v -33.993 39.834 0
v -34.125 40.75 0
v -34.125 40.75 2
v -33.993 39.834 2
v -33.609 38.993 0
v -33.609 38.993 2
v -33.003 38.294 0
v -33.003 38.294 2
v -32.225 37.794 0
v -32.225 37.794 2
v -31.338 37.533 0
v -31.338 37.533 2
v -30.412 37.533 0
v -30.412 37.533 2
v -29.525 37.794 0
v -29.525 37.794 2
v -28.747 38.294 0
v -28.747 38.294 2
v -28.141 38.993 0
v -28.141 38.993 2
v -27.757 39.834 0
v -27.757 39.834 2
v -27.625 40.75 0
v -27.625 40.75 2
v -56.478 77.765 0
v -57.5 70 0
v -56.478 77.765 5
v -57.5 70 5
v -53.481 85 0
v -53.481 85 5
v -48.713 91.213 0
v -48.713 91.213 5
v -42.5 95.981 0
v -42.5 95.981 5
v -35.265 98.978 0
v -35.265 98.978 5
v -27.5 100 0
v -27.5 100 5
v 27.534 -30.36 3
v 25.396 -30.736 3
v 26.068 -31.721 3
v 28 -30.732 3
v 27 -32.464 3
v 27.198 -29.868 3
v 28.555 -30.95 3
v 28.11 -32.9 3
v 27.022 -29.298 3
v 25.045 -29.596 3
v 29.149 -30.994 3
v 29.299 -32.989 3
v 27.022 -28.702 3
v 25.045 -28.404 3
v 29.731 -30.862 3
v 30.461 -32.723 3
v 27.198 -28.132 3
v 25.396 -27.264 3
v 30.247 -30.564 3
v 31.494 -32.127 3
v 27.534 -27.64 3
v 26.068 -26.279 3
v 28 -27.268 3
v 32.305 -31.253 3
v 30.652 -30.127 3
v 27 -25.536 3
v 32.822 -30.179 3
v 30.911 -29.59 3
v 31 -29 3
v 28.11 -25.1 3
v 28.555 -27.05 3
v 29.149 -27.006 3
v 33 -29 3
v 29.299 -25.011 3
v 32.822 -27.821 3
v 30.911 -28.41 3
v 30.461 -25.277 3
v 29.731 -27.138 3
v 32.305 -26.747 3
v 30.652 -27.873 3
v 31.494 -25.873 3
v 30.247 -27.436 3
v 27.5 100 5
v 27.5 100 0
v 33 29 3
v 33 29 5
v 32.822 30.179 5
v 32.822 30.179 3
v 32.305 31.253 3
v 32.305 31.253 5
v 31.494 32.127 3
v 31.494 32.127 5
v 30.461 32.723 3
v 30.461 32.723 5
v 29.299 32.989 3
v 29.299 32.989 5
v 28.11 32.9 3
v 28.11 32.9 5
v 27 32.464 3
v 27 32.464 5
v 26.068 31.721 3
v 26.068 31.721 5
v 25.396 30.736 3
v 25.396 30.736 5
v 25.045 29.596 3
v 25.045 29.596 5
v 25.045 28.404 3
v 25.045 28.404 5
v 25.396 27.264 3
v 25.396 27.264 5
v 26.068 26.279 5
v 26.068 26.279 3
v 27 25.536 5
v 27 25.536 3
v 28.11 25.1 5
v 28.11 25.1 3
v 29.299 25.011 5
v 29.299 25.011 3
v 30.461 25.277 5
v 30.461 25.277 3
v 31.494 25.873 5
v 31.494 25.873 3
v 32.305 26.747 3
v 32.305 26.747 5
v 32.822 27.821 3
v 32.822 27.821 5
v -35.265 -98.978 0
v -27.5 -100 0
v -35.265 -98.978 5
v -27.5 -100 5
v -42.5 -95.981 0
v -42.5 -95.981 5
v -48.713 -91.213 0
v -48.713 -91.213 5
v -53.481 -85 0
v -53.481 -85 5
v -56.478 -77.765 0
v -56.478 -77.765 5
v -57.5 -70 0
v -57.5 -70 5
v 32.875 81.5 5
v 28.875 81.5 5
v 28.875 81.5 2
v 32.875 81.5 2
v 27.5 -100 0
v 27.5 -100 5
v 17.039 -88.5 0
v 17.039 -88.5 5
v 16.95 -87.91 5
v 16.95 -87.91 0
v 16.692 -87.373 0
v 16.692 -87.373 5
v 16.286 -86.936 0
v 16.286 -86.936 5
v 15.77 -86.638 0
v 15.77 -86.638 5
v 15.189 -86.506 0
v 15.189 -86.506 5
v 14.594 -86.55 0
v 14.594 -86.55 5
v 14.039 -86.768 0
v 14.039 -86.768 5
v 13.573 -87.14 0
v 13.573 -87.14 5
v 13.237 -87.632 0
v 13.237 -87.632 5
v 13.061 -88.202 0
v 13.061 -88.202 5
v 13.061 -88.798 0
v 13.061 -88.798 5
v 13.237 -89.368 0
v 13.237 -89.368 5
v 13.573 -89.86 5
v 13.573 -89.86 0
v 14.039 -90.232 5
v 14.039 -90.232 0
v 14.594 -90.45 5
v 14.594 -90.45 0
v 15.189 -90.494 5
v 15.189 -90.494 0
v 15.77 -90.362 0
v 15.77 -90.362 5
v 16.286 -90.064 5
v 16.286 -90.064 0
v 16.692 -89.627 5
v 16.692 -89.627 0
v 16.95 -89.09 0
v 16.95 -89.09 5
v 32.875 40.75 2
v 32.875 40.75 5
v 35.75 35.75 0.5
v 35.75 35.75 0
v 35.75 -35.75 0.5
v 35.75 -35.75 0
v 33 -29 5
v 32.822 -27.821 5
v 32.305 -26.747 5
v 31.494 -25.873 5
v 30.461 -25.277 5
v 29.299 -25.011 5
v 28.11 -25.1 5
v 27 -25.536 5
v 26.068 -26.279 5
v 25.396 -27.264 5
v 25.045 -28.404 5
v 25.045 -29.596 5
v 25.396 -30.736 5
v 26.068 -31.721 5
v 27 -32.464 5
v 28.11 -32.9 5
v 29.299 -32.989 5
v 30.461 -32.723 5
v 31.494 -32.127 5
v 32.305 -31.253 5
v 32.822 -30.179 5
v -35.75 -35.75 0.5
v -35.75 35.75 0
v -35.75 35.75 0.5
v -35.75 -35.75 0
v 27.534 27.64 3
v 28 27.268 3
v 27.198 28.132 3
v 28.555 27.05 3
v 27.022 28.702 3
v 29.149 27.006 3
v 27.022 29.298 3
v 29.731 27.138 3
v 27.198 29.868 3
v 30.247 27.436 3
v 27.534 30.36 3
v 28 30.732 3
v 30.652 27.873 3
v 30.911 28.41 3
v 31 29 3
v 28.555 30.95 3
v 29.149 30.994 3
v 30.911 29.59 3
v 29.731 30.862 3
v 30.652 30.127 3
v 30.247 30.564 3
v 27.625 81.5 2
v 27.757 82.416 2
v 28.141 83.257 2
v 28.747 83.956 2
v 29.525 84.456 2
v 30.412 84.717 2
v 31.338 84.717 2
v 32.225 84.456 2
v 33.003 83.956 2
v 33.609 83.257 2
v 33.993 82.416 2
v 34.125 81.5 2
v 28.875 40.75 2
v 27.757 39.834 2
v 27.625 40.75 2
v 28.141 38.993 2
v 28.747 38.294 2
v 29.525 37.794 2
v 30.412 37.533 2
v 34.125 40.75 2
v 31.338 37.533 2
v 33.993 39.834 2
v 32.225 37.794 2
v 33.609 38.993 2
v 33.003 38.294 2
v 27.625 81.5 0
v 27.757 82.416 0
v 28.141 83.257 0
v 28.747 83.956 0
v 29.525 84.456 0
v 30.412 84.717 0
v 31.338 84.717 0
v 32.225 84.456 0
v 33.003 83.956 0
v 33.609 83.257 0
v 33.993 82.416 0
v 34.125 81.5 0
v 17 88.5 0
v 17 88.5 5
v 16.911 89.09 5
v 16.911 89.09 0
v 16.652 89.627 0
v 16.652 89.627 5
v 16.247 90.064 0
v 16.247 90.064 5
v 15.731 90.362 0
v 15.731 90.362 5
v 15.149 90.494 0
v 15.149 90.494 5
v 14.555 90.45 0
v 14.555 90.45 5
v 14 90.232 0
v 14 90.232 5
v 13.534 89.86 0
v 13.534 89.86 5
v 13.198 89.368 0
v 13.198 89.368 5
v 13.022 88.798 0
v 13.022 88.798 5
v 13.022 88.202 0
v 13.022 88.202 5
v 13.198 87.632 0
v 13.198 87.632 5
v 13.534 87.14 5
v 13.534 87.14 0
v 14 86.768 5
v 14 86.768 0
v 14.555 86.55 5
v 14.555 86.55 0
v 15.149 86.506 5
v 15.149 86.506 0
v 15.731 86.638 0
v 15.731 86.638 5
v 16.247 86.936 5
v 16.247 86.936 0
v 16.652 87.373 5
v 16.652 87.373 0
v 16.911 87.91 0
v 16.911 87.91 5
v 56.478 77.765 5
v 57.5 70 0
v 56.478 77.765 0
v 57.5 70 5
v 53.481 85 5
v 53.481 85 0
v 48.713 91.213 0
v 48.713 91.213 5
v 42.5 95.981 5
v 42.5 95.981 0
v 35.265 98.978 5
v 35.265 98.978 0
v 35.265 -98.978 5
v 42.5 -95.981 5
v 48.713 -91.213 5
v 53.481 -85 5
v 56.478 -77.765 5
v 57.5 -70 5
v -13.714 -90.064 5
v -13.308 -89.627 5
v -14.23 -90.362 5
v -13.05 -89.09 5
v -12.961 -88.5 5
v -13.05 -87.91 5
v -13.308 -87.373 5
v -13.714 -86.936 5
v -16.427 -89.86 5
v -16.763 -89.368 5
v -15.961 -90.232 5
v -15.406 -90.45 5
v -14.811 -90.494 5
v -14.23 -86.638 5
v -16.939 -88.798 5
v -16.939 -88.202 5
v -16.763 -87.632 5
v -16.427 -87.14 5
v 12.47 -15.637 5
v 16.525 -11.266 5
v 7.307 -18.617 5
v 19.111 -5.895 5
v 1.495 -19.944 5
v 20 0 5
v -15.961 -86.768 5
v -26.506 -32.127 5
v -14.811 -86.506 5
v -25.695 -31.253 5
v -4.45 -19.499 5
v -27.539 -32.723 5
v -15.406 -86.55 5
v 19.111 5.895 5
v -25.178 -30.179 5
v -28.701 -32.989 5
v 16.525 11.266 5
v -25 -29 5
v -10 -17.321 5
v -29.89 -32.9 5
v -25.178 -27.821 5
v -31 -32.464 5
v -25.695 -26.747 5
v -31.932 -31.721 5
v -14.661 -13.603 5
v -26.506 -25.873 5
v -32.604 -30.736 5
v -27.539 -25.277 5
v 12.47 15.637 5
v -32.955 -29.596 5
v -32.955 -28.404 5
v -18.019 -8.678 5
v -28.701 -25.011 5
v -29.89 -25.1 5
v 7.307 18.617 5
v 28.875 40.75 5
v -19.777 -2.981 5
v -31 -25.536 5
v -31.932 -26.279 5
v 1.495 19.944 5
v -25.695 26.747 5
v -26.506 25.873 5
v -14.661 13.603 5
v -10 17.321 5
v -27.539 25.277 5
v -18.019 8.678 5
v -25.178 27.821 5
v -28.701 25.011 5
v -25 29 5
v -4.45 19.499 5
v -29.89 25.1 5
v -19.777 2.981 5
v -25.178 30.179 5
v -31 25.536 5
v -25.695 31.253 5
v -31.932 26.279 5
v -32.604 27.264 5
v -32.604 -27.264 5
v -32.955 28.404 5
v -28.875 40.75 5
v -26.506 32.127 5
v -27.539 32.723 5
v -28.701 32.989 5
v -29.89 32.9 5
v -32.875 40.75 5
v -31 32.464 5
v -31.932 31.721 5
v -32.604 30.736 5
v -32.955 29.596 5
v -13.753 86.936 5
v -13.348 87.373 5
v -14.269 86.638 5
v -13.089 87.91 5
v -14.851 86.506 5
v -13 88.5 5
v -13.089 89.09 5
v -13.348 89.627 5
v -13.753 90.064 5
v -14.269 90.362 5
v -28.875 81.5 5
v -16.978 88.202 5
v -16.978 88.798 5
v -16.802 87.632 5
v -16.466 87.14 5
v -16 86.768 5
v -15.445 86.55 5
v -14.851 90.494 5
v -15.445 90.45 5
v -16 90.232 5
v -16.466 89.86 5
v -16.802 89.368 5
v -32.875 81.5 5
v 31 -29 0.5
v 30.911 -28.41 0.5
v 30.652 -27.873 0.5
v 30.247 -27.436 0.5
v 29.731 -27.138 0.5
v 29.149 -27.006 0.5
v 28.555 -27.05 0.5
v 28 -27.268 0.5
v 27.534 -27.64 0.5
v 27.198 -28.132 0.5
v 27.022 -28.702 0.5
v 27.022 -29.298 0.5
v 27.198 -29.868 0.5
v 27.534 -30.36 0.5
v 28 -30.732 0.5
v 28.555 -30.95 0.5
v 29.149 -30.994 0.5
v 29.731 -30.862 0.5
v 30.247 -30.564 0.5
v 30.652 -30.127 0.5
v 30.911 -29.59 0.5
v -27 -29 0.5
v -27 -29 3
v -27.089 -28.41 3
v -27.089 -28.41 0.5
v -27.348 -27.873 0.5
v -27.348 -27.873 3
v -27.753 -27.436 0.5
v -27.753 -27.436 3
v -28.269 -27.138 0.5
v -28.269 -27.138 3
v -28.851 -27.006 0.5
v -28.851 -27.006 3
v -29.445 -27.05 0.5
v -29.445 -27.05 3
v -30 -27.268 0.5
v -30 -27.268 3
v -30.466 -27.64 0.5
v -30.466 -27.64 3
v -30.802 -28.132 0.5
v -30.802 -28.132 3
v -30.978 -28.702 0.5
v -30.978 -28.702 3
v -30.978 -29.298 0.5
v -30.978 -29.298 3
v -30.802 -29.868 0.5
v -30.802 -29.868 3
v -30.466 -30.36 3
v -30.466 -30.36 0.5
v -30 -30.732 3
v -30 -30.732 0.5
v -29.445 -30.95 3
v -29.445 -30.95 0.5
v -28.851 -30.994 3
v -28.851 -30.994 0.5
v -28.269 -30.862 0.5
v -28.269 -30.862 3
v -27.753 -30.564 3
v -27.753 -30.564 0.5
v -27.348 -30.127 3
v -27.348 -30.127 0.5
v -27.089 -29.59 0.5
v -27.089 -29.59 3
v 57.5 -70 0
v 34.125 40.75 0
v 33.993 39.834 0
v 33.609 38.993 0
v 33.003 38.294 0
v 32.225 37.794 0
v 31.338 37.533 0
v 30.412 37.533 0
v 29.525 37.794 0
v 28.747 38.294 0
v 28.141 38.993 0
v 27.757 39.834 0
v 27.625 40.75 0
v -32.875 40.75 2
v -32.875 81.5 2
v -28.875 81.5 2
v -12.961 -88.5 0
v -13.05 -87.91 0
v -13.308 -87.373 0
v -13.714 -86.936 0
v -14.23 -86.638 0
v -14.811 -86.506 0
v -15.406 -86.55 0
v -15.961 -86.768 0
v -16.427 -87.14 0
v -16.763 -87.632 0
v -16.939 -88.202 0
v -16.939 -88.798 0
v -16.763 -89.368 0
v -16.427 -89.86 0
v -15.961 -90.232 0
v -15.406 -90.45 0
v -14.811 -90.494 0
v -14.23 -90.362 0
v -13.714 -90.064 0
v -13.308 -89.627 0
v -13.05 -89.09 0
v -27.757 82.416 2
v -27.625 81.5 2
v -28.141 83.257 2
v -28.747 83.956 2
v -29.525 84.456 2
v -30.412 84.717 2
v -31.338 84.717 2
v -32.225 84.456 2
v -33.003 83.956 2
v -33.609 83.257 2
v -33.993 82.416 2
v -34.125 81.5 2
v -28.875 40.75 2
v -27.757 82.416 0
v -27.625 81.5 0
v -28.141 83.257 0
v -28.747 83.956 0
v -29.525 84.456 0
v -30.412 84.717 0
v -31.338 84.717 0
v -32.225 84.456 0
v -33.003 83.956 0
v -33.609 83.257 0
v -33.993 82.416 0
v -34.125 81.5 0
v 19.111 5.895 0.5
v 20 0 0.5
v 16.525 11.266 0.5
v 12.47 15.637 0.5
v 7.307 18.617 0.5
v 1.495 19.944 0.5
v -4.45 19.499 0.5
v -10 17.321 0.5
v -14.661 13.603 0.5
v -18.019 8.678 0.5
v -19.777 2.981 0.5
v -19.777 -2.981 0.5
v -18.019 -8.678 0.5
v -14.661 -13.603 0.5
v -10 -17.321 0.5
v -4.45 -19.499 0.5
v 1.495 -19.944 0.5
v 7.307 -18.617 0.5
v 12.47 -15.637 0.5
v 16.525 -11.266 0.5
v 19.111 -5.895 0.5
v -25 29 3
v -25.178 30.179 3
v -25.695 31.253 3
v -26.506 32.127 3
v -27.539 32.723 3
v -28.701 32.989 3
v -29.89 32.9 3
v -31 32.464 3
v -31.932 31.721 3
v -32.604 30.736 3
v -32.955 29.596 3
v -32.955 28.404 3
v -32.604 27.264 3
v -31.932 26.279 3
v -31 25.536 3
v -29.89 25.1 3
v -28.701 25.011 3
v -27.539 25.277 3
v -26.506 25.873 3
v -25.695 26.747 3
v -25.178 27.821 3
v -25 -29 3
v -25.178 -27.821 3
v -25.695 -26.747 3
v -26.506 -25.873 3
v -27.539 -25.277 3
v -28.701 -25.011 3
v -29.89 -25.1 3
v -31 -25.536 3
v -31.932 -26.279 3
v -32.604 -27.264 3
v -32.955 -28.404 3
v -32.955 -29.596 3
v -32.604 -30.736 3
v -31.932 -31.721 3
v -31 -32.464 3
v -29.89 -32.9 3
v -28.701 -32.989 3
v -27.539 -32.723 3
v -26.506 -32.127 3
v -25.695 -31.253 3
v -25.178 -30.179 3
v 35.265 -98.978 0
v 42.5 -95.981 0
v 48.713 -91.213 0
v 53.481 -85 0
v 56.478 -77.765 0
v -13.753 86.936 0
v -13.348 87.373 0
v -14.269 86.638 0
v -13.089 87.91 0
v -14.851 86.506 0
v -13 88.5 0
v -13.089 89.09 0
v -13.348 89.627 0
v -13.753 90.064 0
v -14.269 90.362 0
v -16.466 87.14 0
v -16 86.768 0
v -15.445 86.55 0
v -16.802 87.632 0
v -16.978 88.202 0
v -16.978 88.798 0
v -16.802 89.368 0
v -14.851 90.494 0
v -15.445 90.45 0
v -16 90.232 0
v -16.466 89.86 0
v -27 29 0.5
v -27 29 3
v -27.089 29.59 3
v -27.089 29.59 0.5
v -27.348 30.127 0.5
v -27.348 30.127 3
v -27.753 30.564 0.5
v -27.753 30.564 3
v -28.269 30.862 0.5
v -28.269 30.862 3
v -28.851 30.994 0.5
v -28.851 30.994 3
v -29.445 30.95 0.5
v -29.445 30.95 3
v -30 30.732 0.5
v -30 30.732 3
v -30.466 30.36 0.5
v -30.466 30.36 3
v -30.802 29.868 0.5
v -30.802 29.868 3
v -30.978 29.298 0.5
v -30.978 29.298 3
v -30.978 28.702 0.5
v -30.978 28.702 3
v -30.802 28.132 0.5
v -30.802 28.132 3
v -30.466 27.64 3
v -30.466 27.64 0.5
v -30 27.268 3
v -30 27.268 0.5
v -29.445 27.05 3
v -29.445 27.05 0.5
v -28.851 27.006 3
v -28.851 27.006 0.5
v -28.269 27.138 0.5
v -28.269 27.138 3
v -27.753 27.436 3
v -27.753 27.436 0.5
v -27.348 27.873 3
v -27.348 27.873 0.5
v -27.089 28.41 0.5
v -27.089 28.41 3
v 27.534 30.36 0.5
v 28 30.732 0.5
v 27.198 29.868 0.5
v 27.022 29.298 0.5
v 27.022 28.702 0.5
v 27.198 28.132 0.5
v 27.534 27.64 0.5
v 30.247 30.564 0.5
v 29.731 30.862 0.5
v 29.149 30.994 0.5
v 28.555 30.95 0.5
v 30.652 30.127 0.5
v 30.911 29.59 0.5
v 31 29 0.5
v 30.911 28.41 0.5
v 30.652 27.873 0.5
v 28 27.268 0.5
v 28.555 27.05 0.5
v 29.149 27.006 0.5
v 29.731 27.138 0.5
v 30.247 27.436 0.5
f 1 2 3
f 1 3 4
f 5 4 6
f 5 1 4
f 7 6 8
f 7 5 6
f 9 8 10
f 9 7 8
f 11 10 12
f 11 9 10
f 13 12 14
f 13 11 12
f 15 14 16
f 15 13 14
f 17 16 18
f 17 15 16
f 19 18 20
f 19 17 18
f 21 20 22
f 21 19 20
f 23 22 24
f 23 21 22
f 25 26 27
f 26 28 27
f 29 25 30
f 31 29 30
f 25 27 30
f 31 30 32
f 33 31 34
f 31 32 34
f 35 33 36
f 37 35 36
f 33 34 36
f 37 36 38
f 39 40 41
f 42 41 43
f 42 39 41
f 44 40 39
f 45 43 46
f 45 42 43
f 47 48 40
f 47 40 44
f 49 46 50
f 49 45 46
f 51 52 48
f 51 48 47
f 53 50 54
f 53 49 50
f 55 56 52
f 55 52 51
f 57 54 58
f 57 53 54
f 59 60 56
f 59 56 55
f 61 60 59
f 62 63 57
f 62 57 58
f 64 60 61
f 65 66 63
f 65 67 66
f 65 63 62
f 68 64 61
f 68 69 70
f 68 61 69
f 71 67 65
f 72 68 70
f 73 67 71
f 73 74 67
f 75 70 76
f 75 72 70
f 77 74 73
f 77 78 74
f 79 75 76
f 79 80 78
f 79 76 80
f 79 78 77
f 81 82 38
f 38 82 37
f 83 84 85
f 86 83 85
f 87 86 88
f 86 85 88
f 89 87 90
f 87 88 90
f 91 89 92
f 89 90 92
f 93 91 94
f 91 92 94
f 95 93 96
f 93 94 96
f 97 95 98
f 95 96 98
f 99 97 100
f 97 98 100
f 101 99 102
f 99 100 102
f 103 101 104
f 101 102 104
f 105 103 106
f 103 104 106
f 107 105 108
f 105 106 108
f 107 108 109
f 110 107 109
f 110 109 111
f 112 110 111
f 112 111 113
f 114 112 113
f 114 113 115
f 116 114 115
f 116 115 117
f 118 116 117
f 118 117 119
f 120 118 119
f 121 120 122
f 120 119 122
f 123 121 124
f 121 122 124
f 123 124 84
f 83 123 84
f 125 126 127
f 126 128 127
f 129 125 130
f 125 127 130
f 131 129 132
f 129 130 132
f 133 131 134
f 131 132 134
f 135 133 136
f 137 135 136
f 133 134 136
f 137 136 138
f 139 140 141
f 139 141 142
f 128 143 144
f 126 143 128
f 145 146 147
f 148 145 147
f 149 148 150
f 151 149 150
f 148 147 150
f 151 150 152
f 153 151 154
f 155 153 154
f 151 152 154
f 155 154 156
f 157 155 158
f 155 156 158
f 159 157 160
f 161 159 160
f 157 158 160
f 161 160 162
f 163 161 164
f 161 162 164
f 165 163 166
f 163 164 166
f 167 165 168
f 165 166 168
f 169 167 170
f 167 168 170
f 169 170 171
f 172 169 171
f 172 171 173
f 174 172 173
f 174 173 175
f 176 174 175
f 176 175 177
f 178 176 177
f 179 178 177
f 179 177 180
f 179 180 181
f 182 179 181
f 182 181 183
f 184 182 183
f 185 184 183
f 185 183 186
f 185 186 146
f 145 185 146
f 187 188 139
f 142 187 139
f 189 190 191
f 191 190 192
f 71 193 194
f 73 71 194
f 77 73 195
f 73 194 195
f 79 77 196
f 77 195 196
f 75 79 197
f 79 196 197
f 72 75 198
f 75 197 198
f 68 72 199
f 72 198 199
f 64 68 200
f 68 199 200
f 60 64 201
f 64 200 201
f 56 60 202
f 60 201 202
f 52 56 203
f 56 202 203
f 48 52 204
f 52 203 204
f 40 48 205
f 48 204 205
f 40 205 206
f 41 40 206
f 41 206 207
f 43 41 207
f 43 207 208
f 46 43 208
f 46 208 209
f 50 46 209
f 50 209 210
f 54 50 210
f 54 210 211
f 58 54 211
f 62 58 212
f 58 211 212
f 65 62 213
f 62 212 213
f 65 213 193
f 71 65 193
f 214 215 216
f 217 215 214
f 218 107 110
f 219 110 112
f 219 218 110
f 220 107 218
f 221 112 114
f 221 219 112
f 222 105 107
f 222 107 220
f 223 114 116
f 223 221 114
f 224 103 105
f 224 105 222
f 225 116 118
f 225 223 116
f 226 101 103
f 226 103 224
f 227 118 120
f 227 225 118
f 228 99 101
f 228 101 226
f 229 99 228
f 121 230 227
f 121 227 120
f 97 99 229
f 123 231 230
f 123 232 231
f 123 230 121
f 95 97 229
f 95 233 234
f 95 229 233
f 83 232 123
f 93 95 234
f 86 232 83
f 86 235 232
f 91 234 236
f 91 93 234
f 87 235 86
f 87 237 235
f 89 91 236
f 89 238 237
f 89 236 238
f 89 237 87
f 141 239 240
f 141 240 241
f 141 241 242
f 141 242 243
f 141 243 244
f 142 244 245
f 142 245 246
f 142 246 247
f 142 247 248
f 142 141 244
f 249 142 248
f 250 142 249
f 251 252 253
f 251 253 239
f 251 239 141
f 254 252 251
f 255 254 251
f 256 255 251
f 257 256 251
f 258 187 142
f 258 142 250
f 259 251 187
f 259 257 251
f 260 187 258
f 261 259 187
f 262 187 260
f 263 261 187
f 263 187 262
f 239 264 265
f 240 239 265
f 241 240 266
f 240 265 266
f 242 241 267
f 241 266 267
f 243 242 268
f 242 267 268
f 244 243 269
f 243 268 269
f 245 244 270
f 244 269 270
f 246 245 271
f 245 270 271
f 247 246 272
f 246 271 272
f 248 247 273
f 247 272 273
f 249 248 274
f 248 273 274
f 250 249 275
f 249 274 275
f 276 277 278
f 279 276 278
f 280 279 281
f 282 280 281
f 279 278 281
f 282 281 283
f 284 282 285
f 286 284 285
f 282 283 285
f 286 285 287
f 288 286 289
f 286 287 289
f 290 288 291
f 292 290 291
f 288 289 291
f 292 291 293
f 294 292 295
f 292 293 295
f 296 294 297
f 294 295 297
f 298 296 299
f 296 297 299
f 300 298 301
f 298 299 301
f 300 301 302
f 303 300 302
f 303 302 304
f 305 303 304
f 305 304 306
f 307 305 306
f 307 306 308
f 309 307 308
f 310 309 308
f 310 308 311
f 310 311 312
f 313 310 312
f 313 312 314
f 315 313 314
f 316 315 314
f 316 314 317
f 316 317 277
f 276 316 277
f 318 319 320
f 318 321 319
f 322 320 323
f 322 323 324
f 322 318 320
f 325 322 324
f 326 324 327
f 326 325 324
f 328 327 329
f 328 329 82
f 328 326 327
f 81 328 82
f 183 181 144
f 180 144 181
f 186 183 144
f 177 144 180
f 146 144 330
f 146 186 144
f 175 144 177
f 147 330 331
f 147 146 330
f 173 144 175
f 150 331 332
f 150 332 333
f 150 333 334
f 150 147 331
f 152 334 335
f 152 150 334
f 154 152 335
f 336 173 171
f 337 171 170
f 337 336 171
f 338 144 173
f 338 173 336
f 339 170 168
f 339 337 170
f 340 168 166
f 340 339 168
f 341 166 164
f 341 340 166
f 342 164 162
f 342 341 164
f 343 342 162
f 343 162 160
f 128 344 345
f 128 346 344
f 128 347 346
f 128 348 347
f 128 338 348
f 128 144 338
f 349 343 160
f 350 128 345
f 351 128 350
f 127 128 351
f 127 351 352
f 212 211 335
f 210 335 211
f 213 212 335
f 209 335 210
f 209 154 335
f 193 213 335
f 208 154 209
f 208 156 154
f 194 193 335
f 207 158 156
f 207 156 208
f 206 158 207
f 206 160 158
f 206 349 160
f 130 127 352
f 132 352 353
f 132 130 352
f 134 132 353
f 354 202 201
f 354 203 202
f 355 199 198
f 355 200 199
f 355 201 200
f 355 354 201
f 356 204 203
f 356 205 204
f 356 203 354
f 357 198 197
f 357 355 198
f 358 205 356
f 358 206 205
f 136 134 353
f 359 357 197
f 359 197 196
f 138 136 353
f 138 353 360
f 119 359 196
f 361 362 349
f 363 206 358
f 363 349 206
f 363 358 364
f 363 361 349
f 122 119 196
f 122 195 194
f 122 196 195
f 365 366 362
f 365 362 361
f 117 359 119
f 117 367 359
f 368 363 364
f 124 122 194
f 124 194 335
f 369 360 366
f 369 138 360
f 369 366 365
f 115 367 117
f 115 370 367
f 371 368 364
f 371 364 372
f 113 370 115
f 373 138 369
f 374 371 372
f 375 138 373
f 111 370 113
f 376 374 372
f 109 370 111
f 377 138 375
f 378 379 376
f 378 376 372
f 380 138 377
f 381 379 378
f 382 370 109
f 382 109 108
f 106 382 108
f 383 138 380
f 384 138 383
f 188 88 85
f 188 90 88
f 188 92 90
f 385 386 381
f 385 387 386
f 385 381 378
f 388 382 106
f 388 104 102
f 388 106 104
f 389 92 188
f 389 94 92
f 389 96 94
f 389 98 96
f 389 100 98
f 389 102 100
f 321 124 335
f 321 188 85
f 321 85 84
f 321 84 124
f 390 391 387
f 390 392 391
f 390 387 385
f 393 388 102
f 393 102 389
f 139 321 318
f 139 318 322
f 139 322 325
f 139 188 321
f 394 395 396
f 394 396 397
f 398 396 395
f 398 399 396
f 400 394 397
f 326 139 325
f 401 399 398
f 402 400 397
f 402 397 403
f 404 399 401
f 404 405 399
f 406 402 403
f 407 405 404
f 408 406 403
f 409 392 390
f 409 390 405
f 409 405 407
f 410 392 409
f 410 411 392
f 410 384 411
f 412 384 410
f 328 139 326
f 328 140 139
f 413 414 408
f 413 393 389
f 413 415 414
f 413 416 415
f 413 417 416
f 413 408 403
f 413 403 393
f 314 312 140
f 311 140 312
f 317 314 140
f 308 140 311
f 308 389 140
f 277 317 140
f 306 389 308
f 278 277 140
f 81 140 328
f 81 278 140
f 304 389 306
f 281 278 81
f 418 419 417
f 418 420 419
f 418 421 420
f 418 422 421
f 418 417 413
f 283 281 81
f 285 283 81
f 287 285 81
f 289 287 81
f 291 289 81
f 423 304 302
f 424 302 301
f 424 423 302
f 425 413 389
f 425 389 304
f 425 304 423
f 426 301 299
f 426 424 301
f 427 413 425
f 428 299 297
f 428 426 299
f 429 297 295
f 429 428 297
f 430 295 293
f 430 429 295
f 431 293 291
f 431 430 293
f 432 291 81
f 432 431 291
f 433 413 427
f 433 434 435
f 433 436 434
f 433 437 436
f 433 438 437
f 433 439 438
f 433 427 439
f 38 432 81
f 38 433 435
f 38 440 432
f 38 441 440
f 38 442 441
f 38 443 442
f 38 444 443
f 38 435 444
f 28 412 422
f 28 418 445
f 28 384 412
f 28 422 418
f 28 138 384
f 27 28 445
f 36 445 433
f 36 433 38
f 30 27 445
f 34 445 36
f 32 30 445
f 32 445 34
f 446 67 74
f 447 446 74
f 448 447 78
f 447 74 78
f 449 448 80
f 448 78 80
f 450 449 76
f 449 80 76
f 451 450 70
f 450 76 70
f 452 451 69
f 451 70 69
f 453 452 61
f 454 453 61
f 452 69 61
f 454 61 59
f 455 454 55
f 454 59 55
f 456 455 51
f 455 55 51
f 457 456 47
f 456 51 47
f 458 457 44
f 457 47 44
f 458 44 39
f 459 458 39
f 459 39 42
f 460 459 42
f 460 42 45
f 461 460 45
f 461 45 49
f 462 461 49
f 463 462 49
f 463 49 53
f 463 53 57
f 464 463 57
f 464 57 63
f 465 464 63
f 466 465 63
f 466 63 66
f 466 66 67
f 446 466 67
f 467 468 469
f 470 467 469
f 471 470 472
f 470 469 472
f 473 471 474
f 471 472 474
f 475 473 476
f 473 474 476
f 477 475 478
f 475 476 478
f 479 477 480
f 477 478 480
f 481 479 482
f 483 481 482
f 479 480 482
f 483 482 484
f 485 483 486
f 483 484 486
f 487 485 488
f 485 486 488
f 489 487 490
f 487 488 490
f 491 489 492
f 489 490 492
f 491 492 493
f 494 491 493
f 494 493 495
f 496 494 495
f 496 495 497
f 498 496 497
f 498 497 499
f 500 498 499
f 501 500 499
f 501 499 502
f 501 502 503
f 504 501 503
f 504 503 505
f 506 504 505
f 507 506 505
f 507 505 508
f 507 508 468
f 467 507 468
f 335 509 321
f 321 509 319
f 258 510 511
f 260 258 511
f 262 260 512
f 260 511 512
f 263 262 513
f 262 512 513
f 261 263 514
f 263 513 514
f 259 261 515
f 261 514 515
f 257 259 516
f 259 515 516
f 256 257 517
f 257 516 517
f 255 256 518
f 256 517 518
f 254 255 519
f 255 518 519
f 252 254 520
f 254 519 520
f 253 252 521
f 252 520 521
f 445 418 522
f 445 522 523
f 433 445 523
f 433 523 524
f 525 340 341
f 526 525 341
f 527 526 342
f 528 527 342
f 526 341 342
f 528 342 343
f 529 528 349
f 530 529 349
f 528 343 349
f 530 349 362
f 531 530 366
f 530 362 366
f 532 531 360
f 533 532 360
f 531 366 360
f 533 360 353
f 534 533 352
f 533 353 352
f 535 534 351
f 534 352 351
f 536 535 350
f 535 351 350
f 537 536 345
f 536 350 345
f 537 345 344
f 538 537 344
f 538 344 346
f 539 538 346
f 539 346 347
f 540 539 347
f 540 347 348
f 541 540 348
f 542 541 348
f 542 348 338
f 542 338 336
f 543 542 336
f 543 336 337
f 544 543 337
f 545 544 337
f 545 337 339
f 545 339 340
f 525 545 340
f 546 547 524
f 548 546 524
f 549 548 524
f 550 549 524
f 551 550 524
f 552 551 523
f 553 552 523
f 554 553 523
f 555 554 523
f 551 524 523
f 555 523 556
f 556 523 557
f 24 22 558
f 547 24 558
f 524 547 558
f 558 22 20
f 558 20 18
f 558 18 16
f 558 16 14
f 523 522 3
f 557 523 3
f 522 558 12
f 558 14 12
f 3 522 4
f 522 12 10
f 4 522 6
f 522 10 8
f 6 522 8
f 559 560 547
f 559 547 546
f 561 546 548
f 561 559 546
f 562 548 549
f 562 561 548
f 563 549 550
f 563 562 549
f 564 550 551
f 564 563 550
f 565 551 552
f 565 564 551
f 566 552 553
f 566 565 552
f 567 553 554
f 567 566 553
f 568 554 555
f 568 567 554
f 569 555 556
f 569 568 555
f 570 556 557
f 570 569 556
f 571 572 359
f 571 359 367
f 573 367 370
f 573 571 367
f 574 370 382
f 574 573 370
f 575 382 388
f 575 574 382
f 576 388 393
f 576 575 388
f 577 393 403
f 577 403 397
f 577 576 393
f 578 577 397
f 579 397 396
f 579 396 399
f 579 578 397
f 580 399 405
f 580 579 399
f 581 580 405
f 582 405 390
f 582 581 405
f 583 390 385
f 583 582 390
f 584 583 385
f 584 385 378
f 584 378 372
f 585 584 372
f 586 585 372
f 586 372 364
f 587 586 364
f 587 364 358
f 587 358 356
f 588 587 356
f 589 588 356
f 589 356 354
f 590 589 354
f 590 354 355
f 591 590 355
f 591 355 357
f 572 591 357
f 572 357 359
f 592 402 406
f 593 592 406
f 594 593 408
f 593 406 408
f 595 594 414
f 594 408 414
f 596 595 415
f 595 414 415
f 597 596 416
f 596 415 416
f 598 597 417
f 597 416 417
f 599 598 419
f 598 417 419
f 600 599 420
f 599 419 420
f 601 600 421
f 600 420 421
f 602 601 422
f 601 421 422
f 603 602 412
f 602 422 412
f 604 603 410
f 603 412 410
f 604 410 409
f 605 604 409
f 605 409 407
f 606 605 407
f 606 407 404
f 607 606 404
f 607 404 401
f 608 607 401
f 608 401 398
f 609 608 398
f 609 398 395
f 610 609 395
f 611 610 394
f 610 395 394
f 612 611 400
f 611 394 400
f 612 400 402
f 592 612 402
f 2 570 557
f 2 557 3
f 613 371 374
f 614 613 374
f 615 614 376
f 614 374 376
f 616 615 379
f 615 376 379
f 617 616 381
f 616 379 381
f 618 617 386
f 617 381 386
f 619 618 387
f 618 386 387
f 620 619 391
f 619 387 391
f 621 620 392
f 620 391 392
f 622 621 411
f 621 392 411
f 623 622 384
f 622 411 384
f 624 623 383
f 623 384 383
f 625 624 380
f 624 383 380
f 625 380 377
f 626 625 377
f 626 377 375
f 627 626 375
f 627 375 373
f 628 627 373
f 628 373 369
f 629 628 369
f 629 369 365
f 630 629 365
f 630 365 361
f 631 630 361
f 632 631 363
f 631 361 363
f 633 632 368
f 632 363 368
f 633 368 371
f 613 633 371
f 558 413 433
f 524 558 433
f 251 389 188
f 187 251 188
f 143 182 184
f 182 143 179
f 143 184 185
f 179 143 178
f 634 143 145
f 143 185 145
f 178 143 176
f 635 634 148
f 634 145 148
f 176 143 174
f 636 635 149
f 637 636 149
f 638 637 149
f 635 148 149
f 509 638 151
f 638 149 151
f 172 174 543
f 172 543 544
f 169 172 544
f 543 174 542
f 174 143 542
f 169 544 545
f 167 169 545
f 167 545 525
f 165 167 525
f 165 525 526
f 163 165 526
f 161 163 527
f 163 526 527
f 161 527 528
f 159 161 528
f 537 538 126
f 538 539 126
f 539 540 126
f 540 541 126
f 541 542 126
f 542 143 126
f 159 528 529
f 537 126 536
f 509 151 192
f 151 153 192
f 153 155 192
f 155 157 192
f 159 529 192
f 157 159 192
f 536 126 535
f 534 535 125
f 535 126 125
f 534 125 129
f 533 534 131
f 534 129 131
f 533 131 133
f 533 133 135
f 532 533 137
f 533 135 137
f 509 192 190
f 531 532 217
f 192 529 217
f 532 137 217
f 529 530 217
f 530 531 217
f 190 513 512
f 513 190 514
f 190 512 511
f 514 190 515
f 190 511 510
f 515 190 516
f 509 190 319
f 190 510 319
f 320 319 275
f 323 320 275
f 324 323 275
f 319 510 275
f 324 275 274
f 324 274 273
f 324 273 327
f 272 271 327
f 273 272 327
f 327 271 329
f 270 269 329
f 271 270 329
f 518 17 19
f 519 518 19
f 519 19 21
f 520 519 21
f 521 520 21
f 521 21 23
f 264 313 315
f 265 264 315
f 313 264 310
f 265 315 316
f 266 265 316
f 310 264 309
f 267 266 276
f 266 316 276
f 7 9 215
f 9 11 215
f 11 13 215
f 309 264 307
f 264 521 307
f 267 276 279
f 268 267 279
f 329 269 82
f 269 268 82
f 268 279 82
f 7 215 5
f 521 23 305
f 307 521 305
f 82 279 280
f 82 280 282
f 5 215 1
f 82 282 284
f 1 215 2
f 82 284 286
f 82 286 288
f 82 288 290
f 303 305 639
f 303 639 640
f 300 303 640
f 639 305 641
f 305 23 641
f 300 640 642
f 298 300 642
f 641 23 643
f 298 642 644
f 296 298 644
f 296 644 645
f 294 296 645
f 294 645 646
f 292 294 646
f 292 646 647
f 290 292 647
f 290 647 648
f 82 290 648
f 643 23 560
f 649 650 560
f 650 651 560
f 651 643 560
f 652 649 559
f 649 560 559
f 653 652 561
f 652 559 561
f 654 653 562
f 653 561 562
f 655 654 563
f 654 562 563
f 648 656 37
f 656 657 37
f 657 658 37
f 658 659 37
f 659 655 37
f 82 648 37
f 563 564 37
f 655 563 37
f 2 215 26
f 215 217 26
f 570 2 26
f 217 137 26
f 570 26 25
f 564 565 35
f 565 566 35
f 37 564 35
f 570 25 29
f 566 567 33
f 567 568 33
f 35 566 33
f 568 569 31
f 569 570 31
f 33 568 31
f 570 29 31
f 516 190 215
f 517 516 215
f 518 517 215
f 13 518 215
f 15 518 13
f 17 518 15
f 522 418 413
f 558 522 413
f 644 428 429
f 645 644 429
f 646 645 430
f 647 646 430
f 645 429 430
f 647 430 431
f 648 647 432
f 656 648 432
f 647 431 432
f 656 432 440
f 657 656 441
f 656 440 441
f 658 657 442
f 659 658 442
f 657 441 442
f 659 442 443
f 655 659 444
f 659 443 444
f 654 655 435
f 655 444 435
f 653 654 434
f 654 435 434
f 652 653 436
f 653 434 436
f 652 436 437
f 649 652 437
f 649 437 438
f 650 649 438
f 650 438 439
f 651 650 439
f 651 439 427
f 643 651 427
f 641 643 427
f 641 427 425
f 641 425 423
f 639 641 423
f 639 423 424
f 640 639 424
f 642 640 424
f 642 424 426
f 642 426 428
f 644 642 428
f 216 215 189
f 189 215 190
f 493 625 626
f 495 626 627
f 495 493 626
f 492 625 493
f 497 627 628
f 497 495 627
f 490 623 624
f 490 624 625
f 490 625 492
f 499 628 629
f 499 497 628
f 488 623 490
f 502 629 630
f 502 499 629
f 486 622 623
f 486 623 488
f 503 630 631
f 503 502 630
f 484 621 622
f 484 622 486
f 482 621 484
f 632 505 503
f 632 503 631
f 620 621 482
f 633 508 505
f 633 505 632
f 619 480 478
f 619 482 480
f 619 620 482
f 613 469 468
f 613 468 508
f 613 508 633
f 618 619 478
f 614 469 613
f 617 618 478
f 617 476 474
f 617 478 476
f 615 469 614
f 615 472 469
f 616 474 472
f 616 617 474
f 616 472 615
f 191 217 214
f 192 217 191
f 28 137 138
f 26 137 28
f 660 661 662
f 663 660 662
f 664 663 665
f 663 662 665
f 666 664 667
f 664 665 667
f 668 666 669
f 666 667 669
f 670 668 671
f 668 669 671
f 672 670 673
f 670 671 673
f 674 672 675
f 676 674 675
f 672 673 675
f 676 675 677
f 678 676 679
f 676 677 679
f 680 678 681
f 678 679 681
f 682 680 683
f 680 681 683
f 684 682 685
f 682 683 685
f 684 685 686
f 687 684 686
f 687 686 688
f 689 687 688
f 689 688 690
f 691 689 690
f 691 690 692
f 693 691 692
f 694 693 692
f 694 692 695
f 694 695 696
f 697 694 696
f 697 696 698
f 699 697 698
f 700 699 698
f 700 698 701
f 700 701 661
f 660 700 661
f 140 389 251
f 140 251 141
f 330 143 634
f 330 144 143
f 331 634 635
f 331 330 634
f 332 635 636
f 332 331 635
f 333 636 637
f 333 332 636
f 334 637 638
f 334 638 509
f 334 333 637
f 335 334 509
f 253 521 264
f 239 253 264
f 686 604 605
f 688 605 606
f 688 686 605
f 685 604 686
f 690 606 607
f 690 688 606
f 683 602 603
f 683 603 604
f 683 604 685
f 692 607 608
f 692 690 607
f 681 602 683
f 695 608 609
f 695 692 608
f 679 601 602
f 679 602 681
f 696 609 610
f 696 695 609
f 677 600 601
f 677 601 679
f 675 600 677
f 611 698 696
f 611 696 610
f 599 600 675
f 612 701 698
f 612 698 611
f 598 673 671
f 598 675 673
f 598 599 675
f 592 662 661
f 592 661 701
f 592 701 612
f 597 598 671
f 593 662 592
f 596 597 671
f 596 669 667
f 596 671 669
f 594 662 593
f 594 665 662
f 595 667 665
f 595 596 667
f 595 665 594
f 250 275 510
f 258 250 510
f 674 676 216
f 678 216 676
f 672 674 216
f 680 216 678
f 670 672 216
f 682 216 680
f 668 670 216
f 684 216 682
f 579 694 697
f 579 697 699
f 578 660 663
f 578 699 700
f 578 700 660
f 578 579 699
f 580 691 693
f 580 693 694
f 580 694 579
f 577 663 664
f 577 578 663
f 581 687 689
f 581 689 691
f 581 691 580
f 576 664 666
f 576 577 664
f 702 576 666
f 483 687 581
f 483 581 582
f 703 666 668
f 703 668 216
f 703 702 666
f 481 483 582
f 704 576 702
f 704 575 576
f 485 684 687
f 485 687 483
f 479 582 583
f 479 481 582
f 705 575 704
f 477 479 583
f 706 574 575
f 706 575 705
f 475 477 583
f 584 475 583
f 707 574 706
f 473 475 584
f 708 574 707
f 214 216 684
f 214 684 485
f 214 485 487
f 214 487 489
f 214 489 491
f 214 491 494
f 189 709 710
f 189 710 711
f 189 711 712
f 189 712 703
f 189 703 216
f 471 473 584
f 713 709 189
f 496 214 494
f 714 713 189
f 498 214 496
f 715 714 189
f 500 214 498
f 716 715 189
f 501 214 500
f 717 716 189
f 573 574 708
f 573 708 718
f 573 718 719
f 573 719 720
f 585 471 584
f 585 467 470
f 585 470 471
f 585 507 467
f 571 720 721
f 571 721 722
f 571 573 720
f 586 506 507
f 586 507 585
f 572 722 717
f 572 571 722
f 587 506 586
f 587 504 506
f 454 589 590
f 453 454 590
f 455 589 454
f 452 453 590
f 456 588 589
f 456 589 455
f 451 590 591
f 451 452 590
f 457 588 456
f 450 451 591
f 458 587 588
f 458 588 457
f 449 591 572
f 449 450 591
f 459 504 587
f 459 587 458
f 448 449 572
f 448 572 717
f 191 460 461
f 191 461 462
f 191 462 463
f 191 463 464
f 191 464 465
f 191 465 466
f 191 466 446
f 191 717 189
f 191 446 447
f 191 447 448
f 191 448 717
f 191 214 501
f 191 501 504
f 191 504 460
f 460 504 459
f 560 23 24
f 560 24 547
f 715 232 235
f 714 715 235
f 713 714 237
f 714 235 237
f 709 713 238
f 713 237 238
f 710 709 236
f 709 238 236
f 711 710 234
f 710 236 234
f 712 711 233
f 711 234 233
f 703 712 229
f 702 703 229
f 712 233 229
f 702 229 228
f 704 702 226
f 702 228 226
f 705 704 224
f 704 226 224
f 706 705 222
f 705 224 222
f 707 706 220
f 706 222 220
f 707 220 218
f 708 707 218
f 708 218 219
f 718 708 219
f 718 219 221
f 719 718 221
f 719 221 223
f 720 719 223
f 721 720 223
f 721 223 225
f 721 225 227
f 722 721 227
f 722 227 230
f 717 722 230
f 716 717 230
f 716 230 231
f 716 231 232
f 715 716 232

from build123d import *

# Parameters (mm, degrees)
SKETCH1_W           = 200
SKETCH1_H           = 115
SKETCH1_R           = 20
BOSS_EXTRUDE1_DEPTH = 5
CUT_EXTRUDE1_REACH  = 117.461
SKETCH4_R           = 2
SKETCH5_R           = 4
CUT_EXTRUDE2_DEPTH  = 2
FILLET1_R           = 30
SKETCH8_R           = 2
CUT_EXTRUDE4_DEPTH  = 116.461032388
SKETCH11_W          = 71.5
SKETCH11_H          = 71.5
CUT_EXTRUDE7_DEPTH  = 0.5
SKETCH9_W           = 4
SKETCH9_H           = 40.75
CUT_EXTRUDE5_DEPTH  = 116.461032388
CUT_EXTRUDE8_DEPTH  = 2


with BuildPart() as part:
    # Sketch1 → Boss-Extrude1 (new body)
    with BuildSketch(Plane(origin=(0, 0, 0), x_dir=(0, 1, 0), z_dir=(0, 0, 1))):
        Rectangle(SKETCH1_W, SKETCH1_H)
        with Locations(Location((0, 0, 0), (0, 0, 270))):
            Circle(SKETCH1_R, mode=Mode.SUBTRACT)
    extrude(amount=BOSS_EXTRUDE1_DEPTH)

    # Sketch4 → Cut-Extrude1 (cut, up to next)
    with BuildSketch(Plane.XY.offset(5), mode=Mode.PRIVATE) as cut_extrude1_sk1:
        with Locations((29, 29)):
            Circle(SKETCH4_R)
    cut_extrude1_tool1 = extrude(cut_extrude1_sk1.sketch, amount=-CUT_EXTRUDE1_REACH, mode=Mode.PRIVATE) & part.part
    # Sketch4 → Cut-Extrude1 (cut, up to next)
    with BuildSketch(Plane.XY.offset(5), mode=Mode.PRIVATE) as cut_extrude1_sk2:
        with Locations((-29, 29)):
            Circle(SKETCH4_R)
    cut_extrude1_tool2 = extrude(cut_extrude1_sk2.sketch, amount=-CUT_EXTRUDE1_REACH, mode=Mode.PRIVATE) & part.part
    # Sketch4 → Cut-Extrude1 (cut, up to next)
    with BuildSketch(Plane.XY.offset(5), mode=Mode.PRIVATE) as cut_extrude1_sk3:
        with Locations((-29, -29)):
            Circle(SKETCH4_R)
    cut_extrude1_tool3 = extrude(cut_extrude1_sk3.sketch, amount=-CUT_EXTRUDE1_REACH, mode=Mode.PRIVATE) & part.part
    # Sketch4 → Cut-Extrude1 (cut, up to next)
    with BuildSketch(Plane.XY.offset(5), mode=Mode.PRIVATE) as cut_extrude1_sk4:
        with Locations((29, -29)):
            Circle(SKETCH4_R)
    cut_extrude1_tool4 = extrude(cut_extrude1_sk4.sketch, amount=-CUT_EXTRUDE1_REACH, mode=Mode.PRIVATE) & part.part
    add(cut_extrude1_tool1.solids().sort_by_distance((29, 29, 5))[0], mode=Mode.SUBTRACT)
    add(cut_extrude1_tool2.solids().sort_by_distance((-29, 29, 5))[0], mode=Mode.SUBTRACT)
    add(cut_extrude1_tool3.solids().sort_by_distance((-29, -29, 5))[0], mode=Mode.SUBTRACT)
    add(cut_extrude1_tool4.solids().sort_by_distance((29, -29, 5))[0], mode=Mode.SUBTRACT)

    # Sketch5 → Cut-Extrude2 (cut)
    with BuildSketch(Plane.XY.offset(5)):
        with Locations((-29, -29)):
            Circle(SKETCH5_R)
        with Locations((-29, 29)):
            Circle(SKETCH5_R)
        with Locations((29, -29)):
            Circle(SKETCH5_R)
        with Locations((29, 29)):
            Circle(SKETCH5_R)
    extrude(amount=-CUT_EXTRUDE2_DEPTH, mode=Mode.SUBTRACT)

    # Fillet1
    fillet1_edges = [part.edges().sort_by_distance(p)[0] for p in [
        (57.5, 100, 2.5),
        (57.5, -100, 2.5),
        (-57.5, -100, 2.5),
        (-57.5, 100, 2.5),
    ]]
    fillet(fillet1_edges, radius=FILLET1_R)

    # Sketch8 → Cut-Extrude4 (cut, through all)
    with BuildSketch(Plane.XY.offset(5)):
        with Locations((15, 88.5)):
            Circle(SKETCH8_R)
        with Locations((-15, 88.5)):
            Circle(SKETCH8_R)
        with Locations((-14.960853972, -88.5)):
            Circle(SKETCH8_R)
        with Locations((15.039146028, -88.5)):
            Circle(SKETCH8_R)
    extrude(amount=-CUT_EXTRUDE4_DEPTH, mode=Mode.SUBTRACT)

    # Sketch11 → Cut-Extrude7 (cut)
    with BuildSketch(Plane(origin=(0, 0, 0), x_dir=(1, 0, 0), z_dir=(0, 0, -1))):
        Rectangle(SKETCH11_W, SKETCH11_H)
    extrude(amount=-CUT_EXTRUDE7_DEPTH, mode=Mode.SUBTRACT)

    # Sketch9 → Cut-Extrude5 (cut, through all)
    with BuildSketch(Plane.XY.offset(5)):
        with Locations((30.875, 61.125)):
            Rectangle(SKETCH9_W, SKETCH9_H)
        with Locations((-30.875, 61.125)):
            Rectangle(SKETCH9_W, SKETCH9_H)
    extrude(amount=-CUT_EXTRUDE5_DEPTH, mode=Mode.SUBTRACT)

    # Sketch12 → Cut-Extrude8 (cut)
    with BuildSketch(Plane(origin=(0, 0, 0), x_dir=(1, 0, 0), z_dir=(0, 0, -1))):
        with BuildLine():
            Line((-34.125, -81.5), (-34.125, -40.75))
            ThreePointArc((-34.125, -40.75), (-30.875, -37.5), (-27.625, -40.75))
            Line((-27.625, -40.75), (-27.625, -81.5))
            ThreePointArc((-27.625, -81.5), (-30.875, -84.75), (-34.125, -81.5))
        make_face()
        with BuildLine():
            Line((34.125, -81.5), (34.125, -40.75))
            ThreePointArc((34.125, -40.75), (30.875, -37.5), (27.625, -40.75))
            Line((27.625, -40.75), (27.625, -81.5))
            ThreePointArc((27.625, -81.5), (30.875, -84.75), (34.125, -81.5))
        make_face()
    extrude(amount=-CUT_EXTRUDE8_DEPTH, mode=Mode.SUBTRACT)


solid = part.part
